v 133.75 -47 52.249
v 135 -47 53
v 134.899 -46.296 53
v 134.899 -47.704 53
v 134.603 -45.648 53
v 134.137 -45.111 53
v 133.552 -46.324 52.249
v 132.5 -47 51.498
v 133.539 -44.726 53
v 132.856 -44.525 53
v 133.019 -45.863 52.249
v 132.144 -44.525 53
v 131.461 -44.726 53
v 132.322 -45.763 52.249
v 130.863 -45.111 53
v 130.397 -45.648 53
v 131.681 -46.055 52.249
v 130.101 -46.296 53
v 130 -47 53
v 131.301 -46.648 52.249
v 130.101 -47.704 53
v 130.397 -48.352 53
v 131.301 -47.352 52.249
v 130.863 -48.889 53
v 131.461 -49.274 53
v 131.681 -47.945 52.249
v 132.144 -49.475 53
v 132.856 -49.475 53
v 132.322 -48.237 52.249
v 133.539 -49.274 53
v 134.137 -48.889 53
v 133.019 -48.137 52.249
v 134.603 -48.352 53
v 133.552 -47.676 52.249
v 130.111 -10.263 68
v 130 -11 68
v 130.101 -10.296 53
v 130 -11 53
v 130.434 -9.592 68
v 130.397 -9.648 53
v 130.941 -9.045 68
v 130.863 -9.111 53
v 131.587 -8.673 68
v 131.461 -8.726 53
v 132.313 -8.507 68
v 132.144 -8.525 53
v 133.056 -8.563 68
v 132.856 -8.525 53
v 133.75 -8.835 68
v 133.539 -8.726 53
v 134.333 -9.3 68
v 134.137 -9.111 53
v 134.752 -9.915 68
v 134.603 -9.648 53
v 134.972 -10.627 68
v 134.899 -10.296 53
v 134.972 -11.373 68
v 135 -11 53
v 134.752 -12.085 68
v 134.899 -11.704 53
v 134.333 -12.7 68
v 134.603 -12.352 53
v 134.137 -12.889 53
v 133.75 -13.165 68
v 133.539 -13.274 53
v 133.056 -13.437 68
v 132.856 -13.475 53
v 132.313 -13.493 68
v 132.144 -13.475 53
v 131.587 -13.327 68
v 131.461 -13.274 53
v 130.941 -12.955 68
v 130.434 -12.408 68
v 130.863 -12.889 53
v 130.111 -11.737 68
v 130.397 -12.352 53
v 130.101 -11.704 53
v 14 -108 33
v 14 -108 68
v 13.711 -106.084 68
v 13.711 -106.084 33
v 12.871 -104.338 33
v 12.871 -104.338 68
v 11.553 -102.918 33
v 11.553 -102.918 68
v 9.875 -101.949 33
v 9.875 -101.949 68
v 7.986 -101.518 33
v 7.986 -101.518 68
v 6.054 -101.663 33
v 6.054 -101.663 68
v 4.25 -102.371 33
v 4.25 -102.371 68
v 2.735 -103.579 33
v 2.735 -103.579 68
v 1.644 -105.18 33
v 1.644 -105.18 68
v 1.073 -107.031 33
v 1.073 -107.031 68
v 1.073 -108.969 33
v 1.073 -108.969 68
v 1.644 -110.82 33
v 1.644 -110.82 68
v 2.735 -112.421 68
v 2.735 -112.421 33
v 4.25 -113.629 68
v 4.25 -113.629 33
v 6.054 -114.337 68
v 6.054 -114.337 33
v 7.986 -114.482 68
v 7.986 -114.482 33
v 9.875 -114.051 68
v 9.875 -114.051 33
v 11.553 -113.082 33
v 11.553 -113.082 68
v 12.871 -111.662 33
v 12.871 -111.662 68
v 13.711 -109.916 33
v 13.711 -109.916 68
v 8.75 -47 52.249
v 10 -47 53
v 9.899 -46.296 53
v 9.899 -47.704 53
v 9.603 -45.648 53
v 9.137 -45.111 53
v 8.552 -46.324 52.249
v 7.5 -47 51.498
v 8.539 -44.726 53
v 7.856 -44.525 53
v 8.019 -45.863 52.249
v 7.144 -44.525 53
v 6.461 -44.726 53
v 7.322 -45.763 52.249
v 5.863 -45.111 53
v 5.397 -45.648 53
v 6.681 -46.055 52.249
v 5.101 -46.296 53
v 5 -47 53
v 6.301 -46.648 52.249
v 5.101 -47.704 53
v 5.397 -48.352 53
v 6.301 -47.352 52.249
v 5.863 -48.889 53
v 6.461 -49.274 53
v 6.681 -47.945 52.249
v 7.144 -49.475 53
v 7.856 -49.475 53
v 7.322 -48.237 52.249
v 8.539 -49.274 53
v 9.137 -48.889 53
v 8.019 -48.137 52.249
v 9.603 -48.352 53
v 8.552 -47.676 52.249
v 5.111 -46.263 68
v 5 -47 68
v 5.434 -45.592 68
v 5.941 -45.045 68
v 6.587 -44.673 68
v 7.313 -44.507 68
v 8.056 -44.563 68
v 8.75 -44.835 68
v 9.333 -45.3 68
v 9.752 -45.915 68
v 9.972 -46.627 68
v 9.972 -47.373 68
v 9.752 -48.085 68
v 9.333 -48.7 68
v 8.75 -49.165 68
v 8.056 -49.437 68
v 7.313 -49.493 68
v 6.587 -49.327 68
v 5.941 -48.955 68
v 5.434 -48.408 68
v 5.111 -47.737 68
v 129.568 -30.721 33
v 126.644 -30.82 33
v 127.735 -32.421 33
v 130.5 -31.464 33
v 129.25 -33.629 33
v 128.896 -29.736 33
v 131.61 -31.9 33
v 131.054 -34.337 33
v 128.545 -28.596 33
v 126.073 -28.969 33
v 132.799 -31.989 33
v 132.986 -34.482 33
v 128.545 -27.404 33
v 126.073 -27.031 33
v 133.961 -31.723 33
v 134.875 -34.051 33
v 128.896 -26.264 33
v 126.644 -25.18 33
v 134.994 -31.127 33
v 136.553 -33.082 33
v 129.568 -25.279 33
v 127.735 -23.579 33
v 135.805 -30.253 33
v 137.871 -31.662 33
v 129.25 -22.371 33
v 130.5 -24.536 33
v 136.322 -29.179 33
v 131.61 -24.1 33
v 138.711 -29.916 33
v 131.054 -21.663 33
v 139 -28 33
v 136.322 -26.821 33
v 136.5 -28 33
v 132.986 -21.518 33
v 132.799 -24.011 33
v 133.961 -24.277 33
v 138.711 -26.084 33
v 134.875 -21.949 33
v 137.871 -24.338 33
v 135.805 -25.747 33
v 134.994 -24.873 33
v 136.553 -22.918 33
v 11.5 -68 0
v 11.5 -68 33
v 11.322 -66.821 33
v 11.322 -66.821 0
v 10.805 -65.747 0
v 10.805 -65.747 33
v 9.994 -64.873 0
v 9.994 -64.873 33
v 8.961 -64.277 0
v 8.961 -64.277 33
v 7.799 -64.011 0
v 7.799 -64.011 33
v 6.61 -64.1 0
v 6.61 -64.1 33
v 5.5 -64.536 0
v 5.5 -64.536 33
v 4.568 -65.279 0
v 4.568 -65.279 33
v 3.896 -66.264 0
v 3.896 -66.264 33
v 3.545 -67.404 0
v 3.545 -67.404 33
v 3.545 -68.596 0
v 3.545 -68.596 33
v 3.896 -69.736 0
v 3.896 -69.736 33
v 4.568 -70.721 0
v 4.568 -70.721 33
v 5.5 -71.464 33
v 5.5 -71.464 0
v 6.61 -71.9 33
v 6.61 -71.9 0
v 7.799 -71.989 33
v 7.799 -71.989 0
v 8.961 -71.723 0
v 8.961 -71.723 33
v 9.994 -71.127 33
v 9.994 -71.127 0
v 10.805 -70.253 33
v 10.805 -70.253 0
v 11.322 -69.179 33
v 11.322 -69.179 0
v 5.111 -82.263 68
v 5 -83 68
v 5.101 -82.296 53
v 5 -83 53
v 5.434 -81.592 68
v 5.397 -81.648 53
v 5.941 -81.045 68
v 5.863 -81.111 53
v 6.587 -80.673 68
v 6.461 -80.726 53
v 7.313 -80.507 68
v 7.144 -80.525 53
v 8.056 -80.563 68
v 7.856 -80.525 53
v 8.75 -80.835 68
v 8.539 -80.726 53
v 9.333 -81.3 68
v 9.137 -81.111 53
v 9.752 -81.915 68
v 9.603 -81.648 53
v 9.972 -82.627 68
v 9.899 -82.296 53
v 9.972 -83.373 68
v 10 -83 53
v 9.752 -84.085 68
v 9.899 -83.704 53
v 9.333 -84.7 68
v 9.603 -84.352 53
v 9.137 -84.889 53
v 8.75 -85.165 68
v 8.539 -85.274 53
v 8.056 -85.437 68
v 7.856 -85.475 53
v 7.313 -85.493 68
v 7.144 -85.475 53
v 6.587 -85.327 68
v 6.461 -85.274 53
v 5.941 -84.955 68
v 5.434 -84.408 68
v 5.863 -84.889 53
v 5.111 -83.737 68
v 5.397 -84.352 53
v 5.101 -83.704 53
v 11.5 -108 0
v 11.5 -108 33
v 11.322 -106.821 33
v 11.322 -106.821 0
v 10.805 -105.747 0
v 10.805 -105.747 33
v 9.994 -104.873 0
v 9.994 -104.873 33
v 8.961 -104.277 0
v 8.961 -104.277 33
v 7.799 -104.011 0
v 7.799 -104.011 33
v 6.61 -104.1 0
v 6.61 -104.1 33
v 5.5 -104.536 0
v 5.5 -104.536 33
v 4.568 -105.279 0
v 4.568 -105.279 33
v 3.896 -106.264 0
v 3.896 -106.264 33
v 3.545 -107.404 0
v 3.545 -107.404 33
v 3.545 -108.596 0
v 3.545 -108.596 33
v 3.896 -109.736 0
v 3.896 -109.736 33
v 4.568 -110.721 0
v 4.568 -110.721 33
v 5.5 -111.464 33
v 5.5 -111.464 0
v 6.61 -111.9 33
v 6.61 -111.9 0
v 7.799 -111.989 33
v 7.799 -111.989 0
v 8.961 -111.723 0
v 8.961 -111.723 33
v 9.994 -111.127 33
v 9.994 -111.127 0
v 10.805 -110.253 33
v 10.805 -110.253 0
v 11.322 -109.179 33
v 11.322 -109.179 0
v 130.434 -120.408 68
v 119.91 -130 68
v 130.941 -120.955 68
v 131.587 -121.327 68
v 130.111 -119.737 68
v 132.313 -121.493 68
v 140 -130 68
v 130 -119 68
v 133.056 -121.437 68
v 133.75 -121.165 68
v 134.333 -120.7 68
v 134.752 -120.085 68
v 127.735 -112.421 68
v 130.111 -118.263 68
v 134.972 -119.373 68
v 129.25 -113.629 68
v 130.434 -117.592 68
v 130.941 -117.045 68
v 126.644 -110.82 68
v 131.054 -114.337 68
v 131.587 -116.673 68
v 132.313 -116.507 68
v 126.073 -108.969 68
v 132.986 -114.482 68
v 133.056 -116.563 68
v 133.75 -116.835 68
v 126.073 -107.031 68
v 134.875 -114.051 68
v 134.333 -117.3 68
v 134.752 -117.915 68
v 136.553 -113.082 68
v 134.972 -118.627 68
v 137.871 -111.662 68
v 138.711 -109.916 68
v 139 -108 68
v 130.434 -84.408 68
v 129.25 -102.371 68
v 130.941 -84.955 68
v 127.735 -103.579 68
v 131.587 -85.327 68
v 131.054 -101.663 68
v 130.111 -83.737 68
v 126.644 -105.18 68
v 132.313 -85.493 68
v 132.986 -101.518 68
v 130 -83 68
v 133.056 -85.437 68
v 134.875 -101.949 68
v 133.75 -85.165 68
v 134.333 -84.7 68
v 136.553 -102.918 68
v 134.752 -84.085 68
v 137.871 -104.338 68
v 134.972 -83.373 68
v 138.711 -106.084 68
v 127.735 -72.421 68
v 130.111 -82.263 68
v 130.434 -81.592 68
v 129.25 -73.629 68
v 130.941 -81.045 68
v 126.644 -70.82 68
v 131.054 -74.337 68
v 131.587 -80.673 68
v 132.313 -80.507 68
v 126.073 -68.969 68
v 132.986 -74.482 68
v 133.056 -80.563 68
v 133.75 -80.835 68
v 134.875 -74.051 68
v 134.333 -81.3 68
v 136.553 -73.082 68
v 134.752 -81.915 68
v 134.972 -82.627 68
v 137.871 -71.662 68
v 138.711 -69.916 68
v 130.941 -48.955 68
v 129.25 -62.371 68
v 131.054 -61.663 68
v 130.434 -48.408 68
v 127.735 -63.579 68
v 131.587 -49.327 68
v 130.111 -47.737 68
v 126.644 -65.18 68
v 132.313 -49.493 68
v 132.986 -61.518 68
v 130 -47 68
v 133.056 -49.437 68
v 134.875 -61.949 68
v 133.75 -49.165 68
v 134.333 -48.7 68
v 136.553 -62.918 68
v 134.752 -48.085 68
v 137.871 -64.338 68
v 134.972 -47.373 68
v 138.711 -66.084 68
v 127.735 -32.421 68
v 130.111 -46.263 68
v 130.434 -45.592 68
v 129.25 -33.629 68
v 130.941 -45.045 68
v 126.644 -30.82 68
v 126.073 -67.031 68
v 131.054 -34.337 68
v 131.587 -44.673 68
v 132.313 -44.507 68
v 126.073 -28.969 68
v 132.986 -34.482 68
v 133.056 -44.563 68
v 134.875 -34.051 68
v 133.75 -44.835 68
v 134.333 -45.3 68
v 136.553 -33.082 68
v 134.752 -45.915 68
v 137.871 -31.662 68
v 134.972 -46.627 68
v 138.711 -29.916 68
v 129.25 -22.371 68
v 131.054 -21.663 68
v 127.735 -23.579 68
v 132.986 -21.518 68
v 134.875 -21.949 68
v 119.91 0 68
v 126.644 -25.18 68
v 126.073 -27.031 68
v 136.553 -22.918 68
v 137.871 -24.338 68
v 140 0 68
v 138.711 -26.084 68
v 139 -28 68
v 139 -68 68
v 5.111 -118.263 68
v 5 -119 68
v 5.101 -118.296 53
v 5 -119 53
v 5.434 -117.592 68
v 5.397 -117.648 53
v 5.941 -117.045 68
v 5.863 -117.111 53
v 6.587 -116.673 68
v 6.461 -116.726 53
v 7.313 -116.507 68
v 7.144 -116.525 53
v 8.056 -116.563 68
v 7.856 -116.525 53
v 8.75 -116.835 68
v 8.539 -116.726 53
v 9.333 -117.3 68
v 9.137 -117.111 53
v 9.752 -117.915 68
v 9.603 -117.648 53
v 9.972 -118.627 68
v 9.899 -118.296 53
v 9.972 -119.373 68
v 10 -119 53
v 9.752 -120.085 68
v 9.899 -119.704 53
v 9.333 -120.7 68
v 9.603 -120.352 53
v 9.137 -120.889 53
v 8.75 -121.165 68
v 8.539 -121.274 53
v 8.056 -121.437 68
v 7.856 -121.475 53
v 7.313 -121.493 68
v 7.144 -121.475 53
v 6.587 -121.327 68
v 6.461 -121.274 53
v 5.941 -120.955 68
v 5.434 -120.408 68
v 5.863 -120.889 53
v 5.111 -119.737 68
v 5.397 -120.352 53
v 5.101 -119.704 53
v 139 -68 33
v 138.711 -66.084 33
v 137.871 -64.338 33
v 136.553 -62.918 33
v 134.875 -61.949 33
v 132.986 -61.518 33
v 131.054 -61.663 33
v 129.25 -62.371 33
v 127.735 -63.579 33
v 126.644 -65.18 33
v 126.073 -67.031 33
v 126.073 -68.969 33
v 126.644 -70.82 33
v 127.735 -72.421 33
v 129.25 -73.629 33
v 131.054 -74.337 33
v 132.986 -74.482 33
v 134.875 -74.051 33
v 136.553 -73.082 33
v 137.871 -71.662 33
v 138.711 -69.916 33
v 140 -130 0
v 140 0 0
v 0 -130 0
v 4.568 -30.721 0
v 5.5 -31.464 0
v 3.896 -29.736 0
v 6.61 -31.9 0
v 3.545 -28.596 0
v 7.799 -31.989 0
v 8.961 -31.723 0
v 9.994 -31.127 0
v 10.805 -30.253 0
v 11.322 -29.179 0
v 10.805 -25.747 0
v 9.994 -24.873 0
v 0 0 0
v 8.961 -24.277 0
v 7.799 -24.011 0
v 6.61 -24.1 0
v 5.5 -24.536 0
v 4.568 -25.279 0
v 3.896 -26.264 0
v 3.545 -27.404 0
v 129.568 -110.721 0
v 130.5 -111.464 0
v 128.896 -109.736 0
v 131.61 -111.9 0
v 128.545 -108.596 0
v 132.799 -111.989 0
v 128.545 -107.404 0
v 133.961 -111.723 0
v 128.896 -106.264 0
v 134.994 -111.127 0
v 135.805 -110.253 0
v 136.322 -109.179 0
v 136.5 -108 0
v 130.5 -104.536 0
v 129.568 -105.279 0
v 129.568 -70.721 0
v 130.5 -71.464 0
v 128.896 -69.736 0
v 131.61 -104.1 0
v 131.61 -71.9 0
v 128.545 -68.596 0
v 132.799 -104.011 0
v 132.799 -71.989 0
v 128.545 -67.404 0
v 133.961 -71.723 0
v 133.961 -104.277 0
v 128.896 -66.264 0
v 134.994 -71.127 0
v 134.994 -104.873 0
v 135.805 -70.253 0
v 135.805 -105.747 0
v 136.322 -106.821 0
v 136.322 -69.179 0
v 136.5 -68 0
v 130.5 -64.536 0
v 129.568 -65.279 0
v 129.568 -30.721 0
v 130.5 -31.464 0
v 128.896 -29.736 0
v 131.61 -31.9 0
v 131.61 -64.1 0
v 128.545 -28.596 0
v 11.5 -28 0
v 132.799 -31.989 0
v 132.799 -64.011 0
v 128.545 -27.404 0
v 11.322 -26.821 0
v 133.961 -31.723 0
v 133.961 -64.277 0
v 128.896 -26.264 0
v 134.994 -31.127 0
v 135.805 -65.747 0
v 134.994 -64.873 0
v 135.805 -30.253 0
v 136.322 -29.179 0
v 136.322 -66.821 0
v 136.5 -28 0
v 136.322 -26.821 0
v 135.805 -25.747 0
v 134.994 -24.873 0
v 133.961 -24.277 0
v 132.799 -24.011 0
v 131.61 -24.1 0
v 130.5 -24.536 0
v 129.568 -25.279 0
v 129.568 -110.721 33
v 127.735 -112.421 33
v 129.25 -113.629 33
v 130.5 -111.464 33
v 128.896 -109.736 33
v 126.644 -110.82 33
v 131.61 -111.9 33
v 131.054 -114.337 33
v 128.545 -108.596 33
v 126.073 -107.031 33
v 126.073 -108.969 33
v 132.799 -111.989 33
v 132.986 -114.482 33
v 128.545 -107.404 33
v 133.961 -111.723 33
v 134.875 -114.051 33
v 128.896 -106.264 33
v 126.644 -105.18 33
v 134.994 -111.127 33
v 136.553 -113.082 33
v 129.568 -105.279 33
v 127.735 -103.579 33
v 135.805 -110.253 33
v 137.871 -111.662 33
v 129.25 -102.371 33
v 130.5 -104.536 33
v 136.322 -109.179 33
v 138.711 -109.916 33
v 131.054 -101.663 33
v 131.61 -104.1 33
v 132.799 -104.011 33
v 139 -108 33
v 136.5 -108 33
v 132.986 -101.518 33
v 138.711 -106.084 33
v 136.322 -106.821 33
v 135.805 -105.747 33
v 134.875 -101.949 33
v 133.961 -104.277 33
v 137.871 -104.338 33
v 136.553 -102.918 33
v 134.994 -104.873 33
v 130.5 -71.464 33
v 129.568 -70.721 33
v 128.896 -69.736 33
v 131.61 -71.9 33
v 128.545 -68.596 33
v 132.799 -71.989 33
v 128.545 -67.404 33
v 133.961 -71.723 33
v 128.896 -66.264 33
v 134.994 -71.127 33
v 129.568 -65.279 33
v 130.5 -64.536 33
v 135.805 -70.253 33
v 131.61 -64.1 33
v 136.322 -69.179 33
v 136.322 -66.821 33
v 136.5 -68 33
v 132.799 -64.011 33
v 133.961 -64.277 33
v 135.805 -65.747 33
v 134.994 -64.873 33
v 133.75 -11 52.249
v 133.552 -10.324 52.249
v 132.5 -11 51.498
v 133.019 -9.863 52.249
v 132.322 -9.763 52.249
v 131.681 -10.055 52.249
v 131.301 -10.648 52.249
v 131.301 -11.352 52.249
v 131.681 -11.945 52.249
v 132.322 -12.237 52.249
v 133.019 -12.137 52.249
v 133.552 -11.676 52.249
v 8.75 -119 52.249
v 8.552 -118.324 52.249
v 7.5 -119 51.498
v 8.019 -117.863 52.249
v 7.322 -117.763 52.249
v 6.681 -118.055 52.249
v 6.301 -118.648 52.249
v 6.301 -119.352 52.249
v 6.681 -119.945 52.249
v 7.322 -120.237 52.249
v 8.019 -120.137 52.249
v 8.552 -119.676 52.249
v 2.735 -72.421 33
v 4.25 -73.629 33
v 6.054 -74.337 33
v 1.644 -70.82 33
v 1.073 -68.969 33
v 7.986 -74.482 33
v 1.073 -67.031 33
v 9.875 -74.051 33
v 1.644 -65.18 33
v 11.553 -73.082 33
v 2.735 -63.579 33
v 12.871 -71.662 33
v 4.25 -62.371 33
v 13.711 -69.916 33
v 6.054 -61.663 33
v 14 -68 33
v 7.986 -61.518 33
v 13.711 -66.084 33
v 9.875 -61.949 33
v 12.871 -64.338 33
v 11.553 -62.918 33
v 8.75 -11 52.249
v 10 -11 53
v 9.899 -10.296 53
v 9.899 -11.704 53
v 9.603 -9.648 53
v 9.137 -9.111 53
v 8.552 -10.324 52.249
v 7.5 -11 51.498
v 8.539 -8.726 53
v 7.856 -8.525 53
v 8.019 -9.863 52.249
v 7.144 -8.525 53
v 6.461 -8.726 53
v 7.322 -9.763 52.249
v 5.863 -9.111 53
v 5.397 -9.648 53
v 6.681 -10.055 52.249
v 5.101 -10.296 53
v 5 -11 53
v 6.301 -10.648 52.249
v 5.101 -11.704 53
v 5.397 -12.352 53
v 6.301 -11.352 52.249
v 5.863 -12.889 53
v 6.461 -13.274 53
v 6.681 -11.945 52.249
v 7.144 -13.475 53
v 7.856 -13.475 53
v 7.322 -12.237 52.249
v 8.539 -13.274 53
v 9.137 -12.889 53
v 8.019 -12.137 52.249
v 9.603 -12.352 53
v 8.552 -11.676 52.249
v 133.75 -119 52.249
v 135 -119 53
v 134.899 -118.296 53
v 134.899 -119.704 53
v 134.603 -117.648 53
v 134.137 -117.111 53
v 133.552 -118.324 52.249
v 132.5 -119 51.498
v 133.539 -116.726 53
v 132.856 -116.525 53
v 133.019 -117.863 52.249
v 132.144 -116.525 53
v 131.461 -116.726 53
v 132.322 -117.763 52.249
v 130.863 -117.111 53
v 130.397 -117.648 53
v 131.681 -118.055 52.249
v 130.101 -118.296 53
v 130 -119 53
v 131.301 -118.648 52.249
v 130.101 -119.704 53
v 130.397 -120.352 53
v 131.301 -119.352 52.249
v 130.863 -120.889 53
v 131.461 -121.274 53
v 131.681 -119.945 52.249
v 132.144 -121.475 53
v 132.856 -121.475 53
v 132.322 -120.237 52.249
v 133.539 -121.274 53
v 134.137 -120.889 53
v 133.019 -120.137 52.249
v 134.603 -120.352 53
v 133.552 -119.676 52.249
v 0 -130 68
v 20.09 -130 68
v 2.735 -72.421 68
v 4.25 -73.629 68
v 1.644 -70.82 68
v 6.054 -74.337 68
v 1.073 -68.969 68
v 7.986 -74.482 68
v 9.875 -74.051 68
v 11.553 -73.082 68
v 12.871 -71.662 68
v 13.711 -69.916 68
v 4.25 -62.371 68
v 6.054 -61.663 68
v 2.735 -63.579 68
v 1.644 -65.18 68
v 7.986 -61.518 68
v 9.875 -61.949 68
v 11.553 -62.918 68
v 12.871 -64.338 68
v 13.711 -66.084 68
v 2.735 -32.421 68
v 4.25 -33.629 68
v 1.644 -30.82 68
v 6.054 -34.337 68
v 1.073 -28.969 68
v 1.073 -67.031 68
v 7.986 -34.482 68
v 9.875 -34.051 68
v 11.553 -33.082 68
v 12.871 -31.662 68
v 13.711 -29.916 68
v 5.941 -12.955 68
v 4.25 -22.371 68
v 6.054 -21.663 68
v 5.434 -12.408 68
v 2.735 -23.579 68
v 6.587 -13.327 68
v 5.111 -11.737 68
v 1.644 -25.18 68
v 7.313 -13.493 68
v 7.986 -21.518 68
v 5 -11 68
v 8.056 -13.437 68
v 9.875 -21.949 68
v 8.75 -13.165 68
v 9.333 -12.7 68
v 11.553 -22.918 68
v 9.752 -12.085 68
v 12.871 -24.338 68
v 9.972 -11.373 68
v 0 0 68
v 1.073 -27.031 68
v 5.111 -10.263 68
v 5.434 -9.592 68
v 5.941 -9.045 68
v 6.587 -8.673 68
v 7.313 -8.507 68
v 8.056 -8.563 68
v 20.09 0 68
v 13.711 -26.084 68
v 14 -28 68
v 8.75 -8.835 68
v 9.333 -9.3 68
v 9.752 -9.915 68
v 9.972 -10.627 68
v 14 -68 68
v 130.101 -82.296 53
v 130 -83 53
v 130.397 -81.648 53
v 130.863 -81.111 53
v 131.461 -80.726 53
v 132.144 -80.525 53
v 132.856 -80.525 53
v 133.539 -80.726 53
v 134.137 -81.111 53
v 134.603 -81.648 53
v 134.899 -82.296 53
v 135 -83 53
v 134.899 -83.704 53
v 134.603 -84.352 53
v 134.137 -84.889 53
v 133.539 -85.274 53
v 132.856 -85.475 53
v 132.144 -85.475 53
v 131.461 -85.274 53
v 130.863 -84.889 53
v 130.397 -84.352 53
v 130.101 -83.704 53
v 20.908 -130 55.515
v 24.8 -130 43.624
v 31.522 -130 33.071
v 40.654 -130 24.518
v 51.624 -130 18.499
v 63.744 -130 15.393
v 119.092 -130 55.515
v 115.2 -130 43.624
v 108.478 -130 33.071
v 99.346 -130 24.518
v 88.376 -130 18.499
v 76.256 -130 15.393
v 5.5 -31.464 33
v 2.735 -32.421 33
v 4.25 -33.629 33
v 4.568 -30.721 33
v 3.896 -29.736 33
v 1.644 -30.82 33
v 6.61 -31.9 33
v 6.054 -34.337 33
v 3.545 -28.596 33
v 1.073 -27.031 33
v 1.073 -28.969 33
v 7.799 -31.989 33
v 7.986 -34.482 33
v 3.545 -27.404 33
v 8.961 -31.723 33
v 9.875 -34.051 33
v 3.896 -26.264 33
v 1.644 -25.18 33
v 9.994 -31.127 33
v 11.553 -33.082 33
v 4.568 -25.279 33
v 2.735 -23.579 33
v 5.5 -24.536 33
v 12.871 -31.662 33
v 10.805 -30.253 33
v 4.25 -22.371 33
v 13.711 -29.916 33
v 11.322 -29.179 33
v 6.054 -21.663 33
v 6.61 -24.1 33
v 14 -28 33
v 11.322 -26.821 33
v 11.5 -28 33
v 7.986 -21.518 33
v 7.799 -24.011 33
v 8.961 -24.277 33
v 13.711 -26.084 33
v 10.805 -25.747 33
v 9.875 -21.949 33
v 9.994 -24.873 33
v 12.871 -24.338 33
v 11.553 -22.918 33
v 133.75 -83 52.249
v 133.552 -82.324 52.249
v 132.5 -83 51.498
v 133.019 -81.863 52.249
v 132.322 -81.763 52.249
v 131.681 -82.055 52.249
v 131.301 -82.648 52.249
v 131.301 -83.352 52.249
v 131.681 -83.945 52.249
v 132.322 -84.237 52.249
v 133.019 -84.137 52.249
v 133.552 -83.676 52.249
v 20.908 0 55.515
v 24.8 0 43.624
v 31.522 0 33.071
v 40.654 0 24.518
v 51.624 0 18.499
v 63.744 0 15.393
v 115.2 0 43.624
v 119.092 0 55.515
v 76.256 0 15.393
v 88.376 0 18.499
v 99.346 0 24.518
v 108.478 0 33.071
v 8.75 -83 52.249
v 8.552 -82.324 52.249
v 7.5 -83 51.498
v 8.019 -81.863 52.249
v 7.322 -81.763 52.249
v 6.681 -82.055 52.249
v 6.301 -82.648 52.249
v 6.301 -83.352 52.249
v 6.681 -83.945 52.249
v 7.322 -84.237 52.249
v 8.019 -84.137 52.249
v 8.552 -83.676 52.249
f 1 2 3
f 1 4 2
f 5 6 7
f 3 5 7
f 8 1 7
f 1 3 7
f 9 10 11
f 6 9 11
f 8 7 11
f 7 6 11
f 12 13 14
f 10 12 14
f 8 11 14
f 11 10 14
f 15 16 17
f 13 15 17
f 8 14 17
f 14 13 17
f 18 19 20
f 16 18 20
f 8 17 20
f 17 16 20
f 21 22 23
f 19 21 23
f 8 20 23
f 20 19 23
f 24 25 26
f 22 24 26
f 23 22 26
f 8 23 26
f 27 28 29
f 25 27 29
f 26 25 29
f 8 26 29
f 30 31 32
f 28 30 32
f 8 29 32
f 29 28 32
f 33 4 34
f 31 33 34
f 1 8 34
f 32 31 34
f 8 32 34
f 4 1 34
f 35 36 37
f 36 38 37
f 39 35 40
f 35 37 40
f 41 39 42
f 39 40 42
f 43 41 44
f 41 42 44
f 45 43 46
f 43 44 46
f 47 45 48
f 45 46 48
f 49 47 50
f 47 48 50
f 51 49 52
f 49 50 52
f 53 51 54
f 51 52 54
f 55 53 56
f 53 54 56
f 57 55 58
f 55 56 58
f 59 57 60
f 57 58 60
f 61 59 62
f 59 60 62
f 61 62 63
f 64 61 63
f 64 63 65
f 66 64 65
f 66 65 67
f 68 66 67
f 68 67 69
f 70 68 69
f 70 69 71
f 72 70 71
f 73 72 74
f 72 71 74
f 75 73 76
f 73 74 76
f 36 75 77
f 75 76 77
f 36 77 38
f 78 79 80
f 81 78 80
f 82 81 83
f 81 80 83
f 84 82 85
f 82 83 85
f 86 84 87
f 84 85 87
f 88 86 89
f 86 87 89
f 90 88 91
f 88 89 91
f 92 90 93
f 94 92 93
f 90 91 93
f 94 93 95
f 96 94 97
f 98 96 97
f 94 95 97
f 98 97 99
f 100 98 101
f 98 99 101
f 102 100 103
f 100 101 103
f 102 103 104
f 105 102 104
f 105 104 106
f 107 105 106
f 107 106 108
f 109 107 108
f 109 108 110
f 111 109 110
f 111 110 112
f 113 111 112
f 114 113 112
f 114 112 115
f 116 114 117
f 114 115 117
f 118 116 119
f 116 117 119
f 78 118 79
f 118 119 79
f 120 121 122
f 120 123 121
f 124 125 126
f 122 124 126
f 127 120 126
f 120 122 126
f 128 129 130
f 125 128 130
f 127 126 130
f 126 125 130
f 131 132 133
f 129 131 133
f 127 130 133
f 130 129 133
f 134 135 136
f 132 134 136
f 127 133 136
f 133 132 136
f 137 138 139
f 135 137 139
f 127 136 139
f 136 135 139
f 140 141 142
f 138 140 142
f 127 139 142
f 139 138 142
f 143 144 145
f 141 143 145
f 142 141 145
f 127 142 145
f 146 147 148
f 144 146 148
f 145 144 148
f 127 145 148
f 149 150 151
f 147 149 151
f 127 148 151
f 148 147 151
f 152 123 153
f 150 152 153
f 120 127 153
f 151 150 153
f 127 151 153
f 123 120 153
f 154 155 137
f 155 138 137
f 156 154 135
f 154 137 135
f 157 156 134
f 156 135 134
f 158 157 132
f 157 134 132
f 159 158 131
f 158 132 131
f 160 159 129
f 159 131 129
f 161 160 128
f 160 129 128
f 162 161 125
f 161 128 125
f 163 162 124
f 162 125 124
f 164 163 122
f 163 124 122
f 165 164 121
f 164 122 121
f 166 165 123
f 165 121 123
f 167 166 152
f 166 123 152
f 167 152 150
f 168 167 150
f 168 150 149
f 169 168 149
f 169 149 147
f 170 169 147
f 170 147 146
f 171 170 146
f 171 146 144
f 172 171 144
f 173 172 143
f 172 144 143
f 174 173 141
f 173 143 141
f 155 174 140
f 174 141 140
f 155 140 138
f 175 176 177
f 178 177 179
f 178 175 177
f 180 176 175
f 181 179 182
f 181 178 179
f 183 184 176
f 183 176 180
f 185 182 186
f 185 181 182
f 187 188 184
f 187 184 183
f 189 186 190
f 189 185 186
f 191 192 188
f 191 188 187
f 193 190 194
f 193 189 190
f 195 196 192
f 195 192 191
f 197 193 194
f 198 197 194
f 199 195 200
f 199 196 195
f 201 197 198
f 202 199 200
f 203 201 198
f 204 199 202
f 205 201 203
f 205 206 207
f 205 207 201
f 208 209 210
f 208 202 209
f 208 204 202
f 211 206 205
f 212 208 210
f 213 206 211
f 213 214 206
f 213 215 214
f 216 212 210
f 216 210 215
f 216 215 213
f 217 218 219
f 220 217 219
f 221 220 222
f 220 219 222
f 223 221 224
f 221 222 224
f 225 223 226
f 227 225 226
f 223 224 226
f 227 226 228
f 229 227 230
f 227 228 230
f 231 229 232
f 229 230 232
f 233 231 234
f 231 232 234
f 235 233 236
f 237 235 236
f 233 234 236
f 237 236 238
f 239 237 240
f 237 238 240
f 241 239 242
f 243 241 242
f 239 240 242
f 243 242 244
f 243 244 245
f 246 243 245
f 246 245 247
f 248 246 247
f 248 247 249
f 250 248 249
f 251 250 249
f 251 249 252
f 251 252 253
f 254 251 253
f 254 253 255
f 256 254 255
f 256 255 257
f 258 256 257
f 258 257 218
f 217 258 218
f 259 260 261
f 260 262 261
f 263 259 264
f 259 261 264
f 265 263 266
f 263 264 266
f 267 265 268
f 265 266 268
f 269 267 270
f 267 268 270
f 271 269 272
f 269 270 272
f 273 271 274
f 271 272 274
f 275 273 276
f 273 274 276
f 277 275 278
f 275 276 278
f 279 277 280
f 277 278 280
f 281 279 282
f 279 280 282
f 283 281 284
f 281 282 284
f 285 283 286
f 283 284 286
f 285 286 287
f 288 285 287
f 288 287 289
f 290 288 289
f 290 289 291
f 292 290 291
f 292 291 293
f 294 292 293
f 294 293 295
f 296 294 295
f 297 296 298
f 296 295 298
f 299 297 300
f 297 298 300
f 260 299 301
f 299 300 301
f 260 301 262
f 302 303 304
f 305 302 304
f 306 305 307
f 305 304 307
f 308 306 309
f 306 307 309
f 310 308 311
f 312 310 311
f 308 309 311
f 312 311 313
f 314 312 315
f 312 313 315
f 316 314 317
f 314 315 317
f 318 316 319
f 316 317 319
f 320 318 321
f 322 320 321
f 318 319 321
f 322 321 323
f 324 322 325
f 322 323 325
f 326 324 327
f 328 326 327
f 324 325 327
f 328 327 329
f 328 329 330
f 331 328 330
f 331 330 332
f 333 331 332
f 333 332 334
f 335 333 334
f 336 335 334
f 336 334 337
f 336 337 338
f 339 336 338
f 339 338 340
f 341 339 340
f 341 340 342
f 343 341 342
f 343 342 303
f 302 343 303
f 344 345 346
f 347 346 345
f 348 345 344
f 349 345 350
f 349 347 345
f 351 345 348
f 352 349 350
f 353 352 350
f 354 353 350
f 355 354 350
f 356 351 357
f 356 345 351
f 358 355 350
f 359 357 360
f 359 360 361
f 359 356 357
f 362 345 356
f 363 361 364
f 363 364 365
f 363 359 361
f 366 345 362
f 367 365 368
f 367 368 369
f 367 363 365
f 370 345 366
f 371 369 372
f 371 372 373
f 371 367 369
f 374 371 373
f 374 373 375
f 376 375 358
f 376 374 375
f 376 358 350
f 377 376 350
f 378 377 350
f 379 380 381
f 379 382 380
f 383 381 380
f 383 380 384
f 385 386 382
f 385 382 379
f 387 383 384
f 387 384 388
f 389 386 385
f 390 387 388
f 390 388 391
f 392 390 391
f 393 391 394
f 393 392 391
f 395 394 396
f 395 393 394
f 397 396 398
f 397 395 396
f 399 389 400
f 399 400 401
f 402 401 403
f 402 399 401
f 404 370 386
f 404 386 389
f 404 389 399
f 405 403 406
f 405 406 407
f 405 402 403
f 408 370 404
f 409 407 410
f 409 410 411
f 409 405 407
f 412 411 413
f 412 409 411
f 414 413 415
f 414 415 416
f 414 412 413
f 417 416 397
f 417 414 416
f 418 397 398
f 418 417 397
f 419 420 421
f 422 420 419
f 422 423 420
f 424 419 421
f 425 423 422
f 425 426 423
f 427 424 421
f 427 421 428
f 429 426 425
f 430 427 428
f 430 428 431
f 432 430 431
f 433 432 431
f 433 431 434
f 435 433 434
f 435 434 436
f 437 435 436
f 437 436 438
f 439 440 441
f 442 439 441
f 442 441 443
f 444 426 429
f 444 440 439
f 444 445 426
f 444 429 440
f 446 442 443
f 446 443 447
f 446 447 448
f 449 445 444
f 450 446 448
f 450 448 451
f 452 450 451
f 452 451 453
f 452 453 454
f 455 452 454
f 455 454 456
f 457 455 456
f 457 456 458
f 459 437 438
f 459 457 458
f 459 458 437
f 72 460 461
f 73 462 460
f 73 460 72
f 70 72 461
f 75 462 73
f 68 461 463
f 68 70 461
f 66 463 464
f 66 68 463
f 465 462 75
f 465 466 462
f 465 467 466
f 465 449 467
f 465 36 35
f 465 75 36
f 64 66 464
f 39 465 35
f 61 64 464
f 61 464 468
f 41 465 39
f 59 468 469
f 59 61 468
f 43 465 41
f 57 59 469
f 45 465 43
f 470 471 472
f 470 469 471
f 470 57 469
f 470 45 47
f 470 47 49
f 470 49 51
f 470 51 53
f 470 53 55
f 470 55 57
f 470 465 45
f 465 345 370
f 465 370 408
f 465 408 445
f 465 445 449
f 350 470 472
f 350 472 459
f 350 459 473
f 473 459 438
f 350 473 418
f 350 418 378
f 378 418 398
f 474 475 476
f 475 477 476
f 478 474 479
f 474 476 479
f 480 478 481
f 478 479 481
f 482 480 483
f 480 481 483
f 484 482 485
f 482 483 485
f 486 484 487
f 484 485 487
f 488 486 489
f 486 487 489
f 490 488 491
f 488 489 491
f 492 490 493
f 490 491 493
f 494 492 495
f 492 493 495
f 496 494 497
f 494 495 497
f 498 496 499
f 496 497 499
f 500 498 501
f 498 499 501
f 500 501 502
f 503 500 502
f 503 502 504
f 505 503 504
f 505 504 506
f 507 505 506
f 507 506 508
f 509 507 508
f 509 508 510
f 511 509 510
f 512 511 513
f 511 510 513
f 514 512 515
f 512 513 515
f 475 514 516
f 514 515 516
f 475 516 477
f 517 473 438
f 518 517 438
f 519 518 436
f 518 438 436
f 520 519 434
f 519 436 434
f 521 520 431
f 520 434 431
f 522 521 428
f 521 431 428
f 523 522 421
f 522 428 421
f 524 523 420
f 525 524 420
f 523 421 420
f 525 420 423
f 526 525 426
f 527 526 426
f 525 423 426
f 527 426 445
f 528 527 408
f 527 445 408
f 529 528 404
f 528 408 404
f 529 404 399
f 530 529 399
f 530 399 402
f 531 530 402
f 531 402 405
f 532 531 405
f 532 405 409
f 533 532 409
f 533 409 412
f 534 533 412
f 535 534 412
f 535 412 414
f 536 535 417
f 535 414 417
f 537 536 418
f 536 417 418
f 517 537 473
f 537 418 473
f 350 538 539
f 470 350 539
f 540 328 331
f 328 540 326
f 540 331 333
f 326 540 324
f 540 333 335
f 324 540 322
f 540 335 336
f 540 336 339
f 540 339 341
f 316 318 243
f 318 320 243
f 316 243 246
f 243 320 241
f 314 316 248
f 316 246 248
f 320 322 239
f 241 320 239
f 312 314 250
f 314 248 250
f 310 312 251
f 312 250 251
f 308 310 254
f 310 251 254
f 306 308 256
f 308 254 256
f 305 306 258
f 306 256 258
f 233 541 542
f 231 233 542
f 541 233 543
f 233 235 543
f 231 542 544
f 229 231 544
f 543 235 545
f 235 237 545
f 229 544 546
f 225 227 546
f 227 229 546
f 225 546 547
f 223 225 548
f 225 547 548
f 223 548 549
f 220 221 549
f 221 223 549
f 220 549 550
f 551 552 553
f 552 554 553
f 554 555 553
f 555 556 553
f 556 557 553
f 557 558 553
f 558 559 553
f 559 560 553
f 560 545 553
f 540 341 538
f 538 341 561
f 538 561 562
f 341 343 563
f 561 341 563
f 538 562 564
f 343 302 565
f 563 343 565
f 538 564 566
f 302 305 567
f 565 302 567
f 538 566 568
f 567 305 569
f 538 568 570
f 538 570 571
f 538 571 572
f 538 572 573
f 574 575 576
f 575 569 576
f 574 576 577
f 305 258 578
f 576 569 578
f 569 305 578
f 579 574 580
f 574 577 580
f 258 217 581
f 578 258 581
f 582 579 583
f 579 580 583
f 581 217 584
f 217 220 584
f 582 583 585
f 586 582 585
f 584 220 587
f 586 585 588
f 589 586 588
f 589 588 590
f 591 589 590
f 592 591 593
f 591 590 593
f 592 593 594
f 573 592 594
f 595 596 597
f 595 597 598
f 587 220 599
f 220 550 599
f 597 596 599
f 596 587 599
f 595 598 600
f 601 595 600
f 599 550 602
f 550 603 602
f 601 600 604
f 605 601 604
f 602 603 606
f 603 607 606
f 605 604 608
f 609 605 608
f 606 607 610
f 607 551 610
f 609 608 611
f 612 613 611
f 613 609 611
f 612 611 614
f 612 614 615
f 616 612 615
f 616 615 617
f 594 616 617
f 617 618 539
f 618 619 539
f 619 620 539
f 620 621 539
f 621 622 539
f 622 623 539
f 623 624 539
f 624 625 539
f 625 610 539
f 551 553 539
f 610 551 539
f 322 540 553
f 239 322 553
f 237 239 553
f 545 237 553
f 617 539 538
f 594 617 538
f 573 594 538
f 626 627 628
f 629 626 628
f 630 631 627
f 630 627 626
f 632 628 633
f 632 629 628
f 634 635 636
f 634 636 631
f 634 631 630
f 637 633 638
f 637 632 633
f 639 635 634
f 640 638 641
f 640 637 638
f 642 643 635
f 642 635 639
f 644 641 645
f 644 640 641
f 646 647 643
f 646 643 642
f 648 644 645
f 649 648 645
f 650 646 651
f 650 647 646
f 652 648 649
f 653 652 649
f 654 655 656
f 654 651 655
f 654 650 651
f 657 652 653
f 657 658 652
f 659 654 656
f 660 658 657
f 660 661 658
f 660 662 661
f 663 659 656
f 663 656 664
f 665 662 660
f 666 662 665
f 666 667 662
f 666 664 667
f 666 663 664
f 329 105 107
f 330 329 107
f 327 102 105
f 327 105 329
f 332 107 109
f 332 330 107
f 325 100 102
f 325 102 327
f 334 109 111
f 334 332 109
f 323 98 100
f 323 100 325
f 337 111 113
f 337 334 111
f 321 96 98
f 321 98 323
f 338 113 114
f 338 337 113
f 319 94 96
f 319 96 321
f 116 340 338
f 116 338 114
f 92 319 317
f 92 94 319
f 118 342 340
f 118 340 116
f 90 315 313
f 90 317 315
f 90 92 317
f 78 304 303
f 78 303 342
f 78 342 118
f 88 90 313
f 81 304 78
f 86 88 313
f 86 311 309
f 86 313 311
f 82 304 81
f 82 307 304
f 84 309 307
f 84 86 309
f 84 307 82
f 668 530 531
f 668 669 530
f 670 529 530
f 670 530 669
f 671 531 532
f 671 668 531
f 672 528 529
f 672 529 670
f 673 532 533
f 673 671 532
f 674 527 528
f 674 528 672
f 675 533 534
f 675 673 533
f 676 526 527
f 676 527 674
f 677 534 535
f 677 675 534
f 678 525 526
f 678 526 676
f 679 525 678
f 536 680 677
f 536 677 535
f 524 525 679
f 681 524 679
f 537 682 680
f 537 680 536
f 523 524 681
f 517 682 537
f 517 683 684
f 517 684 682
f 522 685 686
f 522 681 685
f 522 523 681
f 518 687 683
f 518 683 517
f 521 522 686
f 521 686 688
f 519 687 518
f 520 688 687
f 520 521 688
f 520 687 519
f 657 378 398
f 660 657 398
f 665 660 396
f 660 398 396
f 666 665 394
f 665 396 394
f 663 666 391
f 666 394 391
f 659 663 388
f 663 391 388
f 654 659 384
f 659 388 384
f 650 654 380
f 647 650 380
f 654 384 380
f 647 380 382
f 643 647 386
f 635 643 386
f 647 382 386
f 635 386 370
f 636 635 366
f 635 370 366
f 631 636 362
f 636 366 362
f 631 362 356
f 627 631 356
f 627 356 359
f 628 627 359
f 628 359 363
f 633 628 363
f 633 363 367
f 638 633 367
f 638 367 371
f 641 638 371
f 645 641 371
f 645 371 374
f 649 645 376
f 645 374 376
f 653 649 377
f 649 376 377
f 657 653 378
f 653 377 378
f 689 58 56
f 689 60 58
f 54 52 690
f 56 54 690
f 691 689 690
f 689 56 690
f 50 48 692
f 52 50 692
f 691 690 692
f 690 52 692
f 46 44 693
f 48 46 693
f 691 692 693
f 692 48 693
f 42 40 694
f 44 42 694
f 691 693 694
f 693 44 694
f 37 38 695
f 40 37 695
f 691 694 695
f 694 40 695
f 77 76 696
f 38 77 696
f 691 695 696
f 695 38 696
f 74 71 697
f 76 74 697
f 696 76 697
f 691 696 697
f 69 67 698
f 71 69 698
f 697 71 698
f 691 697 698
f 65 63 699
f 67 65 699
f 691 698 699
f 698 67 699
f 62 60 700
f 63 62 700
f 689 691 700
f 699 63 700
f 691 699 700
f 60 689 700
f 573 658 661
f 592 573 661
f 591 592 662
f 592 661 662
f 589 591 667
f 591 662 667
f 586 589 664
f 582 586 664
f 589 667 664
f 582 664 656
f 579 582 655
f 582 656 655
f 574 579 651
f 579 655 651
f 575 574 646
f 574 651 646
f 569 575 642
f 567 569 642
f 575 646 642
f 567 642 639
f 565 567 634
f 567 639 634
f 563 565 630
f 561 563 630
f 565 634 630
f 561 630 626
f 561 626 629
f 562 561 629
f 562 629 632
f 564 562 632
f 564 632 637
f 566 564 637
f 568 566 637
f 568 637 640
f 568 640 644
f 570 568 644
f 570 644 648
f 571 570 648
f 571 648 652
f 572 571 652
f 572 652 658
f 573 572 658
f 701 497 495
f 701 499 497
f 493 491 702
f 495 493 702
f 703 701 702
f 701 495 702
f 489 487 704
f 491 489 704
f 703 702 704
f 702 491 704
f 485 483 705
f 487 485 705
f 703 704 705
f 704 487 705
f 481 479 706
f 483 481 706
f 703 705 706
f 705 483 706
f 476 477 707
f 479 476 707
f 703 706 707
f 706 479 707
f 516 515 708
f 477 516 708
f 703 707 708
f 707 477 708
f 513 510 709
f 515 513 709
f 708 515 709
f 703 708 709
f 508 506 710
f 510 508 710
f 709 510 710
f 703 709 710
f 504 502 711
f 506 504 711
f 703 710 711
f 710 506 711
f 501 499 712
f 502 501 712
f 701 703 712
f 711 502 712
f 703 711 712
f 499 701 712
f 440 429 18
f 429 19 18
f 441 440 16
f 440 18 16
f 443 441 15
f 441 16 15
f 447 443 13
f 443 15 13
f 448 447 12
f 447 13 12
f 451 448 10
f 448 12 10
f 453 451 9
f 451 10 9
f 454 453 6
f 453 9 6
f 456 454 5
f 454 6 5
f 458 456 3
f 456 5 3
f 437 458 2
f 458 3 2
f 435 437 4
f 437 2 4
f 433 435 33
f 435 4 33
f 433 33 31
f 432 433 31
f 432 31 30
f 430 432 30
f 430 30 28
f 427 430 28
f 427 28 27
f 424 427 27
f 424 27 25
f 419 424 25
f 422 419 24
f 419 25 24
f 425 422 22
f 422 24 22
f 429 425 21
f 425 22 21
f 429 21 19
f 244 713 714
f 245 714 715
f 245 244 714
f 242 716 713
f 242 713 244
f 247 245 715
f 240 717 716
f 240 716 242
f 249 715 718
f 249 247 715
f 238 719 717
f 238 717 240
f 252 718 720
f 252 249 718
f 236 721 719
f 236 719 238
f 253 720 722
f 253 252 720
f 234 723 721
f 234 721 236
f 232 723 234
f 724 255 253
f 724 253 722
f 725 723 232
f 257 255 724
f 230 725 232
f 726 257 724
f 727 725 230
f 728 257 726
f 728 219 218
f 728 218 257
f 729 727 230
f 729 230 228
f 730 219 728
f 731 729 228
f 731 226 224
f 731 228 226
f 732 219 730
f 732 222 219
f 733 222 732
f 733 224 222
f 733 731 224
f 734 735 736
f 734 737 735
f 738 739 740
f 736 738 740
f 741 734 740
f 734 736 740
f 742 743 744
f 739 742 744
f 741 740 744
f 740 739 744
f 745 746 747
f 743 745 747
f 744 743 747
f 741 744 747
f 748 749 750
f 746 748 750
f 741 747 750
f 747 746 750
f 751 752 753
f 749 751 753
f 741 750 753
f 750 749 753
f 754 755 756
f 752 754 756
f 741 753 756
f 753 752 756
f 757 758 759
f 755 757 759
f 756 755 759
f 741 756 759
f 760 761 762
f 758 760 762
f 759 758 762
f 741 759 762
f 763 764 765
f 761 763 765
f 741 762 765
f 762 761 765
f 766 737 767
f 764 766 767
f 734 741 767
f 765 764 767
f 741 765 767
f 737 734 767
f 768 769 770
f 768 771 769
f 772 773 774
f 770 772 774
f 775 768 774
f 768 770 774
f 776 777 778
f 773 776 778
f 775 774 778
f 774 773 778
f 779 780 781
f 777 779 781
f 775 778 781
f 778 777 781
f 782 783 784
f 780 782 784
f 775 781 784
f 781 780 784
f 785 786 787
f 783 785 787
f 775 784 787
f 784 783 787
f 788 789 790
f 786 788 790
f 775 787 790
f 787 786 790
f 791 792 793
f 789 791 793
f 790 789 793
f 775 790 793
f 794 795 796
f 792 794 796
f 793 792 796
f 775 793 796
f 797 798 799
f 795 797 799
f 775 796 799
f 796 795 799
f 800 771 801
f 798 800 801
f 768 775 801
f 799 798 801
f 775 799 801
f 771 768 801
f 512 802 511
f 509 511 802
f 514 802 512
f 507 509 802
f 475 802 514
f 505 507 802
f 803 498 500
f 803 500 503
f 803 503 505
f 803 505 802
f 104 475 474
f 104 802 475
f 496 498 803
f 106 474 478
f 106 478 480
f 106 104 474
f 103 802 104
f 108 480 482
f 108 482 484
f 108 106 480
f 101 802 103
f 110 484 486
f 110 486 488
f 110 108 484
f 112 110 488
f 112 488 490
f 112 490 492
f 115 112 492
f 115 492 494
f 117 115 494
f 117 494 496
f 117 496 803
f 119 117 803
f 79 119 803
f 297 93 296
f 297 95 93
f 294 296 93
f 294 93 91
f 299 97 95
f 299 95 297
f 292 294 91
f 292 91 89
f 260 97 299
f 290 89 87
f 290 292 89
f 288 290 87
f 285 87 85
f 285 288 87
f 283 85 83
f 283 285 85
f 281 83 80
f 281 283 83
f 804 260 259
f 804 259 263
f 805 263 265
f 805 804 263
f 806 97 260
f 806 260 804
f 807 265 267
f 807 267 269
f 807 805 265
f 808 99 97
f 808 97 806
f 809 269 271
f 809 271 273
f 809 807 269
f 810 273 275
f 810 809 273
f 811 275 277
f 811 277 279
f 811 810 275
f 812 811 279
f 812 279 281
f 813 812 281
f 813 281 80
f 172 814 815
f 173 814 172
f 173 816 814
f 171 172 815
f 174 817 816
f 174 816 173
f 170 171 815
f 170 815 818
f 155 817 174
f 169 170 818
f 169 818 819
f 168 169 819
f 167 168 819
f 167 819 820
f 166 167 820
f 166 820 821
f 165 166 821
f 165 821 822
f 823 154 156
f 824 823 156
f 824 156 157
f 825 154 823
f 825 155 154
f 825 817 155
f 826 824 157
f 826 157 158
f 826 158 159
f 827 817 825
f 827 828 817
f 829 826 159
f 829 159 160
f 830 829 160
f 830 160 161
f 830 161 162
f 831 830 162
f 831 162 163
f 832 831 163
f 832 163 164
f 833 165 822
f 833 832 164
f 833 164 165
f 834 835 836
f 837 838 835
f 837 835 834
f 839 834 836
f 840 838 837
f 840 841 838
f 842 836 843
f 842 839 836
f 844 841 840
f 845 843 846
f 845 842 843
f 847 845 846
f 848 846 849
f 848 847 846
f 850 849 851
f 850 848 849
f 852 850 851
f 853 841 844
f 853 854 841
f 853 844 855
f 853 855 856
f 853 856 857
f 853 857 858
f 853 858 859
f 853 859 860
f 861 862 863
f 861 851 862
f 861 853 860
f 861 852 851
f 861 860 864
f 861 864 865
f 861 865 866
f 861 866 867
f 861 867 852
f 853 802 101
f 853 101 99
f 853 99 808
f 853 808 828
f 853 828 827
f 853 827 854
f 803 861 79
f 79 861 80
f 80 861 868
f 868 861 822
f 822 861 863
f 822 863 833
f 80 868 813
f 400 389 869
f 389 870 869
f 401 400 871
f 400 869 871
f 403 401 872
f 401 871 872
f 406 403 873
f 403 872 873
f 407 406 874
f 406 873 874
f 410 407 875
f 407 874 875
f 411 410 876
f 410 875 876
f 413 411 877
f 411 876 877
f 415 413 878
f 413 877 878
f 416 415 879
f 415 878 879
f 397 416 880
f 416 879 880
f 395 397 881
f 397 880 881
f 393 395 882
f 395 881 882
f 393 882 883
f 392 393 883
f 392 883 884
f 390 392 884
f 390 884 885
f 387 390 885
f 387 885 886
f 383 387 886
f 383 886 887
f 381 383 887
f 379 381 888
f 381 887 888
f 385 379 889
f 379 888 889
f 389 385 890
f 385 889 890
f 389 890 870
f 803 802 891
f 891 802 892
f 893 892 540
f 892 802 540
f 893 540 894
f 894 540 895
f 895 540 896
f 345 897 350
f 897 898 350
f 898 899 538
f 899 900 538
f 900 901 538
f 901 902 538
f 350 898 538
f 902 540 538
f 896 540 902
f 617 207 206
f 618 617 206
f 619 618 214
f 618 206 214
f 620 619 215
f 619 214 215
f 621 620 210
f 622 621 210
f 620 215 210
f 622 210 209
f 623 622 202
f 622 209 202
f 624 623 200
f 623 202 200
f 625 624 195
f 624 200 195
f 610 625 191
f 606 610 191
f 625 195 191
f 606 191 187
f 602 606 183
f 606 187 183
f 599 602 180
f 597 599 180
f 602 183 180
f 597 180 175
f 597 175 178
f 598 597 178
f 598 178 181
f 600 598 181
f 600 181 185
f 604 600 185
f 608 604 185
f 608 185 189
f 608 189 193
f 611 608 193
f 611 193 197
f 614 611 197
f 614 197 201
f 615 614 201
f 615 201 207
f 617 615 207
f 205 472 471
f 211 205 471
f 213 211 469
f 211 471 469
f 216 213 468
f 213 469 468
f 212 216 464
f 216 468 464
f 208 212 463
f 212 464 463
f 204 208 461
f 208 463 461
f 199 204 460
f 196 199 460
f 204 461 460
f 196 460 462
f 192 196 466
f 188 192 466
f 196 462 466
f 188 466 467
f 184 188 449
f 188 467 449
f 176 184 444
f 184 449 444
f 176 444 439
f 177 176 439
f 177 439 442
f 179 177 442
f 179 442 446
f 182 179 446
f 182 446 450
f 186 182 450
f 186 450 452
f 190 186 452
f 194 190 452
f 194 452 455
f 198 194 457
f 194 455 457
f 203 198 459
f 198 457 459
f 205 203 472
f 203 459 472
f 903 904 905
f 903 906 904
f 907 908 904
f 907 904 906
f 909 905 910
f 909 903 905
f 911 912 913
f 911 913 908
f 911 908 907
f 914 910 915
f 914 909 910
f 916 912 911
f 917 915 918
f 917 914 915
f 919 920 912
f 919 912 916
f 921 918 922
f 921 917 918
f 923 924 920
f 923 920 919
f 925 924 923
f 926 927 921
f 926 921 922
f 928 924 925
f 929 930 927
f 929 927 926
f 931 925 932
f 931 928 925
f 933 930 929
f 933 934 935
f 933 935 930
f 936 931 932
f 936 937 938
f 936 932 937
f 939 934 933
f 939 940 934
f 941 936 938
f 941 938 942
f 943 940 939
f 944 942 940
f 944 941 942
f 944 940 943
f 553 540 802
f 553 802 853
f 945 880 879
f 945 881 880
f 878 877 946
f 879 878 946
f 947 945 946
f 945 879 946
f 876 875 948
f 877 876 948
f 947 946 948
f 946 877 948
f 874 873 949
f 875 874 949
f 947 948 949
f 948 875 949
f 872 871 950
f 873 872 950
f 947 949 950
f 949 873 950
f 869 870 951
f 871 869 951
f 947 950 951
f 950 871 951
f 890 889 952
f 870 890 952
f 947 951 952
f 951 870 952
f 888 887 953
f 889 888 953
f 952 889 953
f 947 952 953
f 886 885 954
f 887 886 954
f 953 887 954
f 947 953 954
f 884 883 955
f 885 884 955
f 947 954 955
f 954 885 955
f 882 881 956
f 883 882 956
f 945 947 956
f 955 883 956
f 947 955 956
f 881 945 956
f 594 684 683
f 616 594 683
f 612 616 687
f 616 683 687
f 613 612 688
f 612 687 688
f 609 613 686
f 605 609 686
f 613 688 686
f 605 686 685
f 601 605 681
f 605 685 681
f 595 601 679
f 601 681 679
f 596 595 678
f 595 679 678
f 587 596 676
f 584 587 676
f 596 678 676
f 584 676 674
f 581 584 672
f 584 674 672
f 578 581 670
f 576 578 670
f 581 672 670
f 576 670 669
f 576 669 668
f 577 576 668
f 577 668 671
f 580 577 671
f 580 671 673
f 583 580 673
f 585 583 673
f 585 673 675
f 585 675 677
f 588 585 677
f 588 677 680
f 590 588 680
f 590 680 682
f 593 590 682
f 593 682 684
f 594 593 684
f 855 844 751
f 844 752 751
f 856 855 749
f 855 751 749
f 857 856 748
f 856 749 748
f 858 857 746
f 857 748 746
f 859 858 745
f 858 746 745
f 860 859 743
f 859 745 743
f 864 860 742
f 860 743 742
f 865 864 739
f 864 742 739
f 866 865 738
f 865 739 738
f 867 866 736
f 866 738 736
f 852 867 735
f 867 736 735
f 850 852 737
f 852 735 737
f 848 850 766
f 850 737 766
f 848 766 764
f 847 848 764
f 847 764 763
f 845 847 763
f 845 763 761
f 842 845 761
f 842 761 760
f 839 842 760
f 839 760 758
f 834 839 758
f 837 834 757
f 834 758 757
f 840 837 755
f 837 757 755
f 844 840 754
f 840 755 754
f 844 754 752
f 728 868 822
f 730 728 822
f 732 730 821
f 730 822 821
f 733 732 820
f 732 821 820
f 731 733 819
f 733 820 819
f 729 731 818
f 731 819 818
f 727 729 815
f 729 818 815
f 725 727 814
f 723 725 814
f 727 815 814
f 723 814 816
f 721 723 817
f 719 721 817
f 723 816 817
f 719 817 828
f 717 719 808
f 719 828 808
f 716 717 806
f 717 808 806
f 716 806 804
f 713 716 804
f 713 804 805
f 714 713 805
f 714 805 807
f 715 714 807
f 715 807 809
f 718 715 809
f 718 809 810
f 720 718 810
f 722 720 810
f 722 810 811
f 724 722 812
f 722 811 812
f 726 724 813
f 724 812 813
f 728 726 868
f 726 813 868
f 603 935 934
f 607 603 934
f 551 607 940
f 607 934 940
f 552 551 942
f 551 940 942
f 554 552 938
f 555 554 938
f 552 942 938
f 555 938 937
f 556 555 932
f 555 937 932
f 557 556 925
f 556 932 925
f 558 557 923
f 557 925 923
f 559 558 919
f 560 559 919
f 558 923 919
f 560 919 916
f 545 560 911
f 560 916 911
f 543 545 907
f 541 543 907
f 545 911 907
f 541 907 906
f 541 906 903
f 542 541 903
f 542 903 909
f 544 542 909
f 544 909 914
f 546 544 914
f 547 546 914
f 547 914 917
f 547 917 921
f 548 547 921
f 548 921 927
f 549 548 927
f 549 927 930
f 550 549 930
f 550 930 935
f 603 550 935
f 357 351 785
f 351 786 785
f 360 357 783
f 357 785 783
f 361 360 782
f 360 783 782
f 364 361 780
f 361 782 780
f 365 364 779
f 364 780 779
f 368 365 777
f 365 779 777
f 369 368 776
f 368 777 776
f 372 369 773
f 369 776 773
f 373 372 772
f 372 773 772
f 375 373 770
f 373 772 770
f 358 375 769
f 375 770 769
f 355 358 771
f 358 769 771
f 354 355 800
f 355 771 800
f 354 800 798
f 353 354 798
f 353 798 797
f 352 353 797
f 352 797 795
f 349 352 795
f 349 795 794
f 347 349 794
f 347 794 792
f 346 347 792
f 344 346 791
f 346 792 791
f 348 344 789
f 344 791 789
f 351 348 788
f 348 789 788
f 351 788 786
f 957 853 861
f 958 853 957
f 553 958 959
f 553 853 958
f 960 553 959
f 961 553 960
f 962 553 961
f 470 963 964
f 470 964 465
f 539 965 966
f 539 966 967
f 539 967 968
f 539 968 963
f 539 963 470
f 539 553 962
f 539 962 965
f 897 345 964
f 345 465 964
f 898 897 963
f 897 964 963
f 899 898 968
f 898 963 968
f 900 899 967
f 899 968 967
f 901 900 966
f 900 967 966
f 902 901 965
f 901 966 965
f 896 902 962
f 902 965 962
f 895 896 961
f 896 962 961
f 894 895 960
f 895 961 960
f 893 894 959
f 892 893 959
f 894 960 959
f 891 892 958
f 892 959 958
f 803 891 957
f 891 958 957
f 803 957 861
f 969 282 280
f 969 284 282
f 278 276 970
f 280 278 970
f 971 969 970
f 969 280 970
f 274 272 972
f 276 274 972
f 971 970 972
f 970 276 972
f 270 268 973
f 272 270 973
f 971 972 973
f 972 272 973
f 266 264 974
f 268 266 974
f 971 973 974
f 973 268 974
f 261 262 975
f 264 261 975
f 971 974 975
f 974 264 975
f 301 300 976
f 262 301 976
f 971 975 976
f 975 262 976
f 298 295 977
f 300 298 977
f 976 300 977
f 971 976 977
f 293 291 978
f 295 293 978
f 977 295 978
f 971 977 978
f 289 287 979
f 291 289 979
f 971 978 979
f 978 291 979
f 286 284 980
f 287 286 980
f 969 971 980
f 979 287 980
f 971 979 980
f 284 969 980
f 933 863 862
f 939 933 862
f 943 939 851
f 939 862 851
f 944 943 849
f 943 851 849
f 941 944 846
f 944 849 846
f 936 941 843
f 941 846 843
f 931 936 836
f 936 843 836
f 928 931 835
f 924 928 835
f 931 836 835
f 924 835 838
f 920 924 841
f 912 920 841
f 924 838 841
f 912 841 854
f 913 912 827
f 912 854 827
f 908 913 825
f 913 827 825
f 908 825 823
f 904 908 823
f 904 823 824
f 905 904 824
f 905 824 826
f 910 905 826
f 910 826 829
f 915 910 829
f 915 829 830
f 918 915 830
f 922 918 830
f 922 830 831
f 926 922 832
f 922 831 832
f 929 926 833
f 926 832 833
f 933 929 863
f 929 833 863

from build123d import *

# Parameters (mm, degrees)
SKETCH_1_W              = 140
SKETCH_1_H              = 130
EXTRUDE_1_DEPTH         = 68
SKETCH_2_R              = 50
CUT_EXTRUDE_2_DEPTH     = 131
SKETCH_3_R              = 6.5
CUT_EXTRUDE_3_DEPTH     = 35
SKETCH_4_R              = 4
CUT_EXTRUDE_4_DEPTH     = 34
HOLE_WIZARD_M6_10_D     = 5
HOLE_WIZARD_M6_10_DEPTH = 15
HOLE_WIZARD_M6_10_TIP   = 1.502151548


with BuildPart() as part:
    # 草图1 → 凸台-拉伸1 (new body)
    with BuildSketch(Plane.XY):
        with Locations((70, -65)):
            Rectangle(SKETCH_1_W, SKETCH_1_H)
    extrude(amount=EXTRUDE_1_DEPTH)

    # 草图2 → 切除-拉伸2 (cut, through all)
    with BuildSketch(Plane(origin=(0, 0, 0), x_dir=(1, 0, 0), z_dir=(0, 1, 0))):
        with Locations((70, -65)):
            Circle(SKETCH_2_R)
    extrude(amount=-CUT_EXTRUDE_2_DEPTH, mode=Mode.SUBTRACT)

    # 草图3 → 切除-拉伸3 (cut)
    with BuildSketch(Plane.XY.offset(68)):
        with Locations((7.5, -28)):
            Circle(SKETCH_3_R)
        with Locations((132.5, -28)):
            Circle(SKETCH_3_R)
        with Locations((132.5, -68)):
            Circle(SKETCH_3_R)
        with Locations((132.5, -108)):
            Circle(SKETCH_3_R)
        with Locations((7.5, -68)):
            Circle(SKETCH_3_R)
        with Locations((7.5, -108)):
            Circle(SKETCH_3_R)
    extrude(amount=-CUT_EXTRUDE_3_DEPTH, mode=Mode.SUBTRACT)

    # 草图4 → 切除-拉伸4 (cut, through all)
    with BuildSketch(Plane.XY.offset(33)):
        with Locations((132.5, -28)):
            Circle(SKETCH_4_R)
        with Locations((7.5, -28)):
            Circle(SKETCH_4_R)
        with Locations((132.5, -68)):
            Circle(SKETCH_4_R)
        with Locations((132.5, -108)):
            Circle(SKETCH_4_R)
        with Locations((7.5, -68)):
            Circle(SKETCH_4_R)
        with Locations((7.5, -108)):
            Circle(SKETCH_4_R)
    extrude(amount=-CUT_EXTRUDE_4_DEPTH, mode=Mode.SUBTRACT)

    # M6 螺纹孔10
    with Locations(Plane.XY.offset(68)):
        with Locations((7.5, -11), (7.5, -47), (7.5, -83), (132.5, -83), (132.5, -47), (132.5, -11), (7.5, -119), (132.5, -119)):
            Hole(HOLE_WIZARD_M6_10_D / 2, depth=HOLE_WIZARD_M6_10_DEPTH)
            with Locations((0, 0, -(HOLE_WIZARD_M6_10_DEPTH + HOLE_WIZARD_M6_10_TIP / 2))):  # 118° drill point
                Cone(0, HOLE_WIZARD_M6_10_D / 2, HOLE_WIZARD_M6_10_TIP, mode=Mode.SUBTRACT)


solid = part.part
